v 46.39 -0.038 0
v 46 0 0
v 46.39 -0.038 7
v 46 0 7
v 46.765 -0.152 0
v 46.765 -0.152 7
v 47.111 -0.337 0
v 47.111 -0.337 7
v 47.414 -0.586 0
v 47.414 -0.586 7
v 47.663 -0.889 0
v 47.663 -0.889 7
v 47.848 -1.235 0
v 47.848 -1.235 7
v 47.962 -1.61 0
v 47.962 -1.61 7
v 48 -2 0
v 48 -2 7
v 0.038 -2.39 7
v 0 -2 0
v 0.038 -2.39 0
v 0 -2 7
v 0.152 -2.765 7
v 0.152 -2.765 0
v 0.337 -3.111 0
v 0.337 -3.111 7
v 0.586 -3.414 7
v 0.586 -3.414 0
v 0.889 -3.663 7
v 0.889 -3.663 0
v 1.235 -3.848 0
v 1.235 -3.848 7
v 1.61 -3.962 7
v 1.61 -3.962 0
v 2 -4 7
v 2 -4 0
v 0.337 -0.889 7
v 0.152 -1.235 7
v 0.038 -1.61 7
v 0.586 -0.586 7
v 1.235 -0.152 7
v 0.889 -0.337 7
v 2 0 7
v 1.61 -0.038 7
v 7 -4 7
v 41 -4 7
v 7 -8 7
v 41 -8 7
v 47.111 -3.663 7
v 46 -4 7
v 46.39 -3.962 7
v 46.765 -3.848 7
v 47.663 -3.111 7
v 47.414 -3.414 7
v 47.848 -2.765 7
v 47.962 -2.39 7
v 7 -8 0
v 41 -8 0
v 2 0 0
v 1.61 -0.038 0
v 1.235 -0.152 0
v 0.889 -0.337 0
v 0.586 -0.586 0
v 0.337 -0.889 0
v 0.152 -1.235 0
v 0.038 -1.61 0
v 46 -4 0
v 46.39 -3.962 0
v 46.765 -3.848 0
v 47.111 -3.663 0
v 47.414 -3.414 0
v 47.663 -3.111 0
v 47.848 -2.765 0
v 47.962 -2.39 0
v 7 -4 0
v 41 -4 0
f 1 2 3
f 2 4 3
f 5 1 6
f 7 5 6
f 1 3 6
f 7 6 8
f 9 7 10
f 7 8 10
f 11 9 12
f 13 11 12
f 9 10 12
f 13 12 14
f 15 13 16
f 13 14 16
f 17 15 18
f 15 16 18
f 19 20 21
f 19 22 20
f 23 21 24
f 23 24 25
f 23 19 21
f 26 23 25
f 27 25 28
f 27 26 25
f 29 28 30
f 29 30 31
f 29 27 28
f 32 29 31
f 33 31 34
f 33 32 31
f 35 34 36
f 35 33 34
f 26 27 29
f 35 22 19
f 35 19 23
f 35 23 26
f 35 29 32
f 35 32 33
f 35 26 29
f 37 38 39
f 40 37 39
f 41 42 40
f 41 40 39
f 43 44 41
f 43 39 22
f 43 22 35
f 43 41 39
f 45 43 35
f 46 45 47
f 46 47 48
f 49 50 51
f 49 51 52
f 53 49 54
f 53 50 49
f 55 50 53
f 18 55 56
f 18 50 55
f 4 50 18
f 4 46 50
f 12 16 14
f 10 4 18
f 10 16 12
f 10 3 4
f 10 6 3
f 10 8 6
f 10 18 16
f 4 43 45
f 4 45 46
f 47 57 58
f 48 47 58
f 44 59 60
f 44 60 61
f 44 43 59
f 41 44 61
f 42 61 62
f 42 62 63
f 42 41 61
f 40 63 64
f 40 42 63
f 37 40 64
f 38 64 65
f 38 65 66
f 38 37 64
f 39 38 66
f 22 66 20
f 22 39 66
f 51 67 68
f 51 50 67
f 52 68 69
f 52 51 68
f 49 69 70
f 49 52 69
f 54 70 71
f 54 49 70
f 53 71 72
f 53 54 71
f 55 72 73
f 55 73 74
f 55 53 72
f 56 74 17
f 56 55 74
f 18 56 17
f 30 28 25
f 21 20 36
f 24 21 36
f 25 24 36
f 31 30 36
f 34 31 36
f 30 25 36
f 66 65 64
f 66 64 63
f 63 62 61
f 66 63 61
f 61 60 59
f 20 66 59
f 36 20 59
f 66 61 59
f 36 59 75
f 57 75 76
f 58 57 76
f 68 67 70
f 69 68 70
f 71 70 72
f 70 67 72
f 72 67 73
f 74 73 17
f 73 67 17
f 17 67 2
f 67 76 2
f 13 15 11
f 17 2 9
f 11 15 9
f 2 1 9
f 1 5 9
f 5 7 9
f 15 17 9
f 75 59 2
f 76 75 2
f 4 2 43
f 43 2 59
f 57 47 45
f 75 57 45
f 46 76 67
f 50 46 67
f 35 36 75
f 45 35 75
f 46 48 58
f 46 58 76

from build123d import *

# Parameters (mm, degrees)
F0_W     = 34
F0_H     = 4
F1_DEPTH = 7
F2_R     = 1.99999


# Not quite as in the source:
# - a fillet or chamfer is up to 0.001 mm smaller than in the source, because OpenCascade refuses the exact size


with BuildPart() as f1:
    # F0 (on Top) → F1 (new body)
    with BuildSketch(Plane.XY):
        Polygon((48, 0), (0, 0), (0, -4), (7, -4), (41, -4), (48, -4), align=None)
        with Locations((24, -6)):
            Rectangle(F0_W, F0_H)
    extrude(amount=F1_DEPTH)

    # F2 (radius 2 in the source; OpenCascade refuses exactly that, so slightly less here)
    f2_edges = [f1.edges().sort_by_distance(p)[0] for p in [
        (48, -4, 3.5),
        (48, 0, 3.5),
        (0, -4, 3.5),
        (0, 0, 3.5),
    ]]
    fillet(f2_edges, radius=F2_R)


solid = f1.part
